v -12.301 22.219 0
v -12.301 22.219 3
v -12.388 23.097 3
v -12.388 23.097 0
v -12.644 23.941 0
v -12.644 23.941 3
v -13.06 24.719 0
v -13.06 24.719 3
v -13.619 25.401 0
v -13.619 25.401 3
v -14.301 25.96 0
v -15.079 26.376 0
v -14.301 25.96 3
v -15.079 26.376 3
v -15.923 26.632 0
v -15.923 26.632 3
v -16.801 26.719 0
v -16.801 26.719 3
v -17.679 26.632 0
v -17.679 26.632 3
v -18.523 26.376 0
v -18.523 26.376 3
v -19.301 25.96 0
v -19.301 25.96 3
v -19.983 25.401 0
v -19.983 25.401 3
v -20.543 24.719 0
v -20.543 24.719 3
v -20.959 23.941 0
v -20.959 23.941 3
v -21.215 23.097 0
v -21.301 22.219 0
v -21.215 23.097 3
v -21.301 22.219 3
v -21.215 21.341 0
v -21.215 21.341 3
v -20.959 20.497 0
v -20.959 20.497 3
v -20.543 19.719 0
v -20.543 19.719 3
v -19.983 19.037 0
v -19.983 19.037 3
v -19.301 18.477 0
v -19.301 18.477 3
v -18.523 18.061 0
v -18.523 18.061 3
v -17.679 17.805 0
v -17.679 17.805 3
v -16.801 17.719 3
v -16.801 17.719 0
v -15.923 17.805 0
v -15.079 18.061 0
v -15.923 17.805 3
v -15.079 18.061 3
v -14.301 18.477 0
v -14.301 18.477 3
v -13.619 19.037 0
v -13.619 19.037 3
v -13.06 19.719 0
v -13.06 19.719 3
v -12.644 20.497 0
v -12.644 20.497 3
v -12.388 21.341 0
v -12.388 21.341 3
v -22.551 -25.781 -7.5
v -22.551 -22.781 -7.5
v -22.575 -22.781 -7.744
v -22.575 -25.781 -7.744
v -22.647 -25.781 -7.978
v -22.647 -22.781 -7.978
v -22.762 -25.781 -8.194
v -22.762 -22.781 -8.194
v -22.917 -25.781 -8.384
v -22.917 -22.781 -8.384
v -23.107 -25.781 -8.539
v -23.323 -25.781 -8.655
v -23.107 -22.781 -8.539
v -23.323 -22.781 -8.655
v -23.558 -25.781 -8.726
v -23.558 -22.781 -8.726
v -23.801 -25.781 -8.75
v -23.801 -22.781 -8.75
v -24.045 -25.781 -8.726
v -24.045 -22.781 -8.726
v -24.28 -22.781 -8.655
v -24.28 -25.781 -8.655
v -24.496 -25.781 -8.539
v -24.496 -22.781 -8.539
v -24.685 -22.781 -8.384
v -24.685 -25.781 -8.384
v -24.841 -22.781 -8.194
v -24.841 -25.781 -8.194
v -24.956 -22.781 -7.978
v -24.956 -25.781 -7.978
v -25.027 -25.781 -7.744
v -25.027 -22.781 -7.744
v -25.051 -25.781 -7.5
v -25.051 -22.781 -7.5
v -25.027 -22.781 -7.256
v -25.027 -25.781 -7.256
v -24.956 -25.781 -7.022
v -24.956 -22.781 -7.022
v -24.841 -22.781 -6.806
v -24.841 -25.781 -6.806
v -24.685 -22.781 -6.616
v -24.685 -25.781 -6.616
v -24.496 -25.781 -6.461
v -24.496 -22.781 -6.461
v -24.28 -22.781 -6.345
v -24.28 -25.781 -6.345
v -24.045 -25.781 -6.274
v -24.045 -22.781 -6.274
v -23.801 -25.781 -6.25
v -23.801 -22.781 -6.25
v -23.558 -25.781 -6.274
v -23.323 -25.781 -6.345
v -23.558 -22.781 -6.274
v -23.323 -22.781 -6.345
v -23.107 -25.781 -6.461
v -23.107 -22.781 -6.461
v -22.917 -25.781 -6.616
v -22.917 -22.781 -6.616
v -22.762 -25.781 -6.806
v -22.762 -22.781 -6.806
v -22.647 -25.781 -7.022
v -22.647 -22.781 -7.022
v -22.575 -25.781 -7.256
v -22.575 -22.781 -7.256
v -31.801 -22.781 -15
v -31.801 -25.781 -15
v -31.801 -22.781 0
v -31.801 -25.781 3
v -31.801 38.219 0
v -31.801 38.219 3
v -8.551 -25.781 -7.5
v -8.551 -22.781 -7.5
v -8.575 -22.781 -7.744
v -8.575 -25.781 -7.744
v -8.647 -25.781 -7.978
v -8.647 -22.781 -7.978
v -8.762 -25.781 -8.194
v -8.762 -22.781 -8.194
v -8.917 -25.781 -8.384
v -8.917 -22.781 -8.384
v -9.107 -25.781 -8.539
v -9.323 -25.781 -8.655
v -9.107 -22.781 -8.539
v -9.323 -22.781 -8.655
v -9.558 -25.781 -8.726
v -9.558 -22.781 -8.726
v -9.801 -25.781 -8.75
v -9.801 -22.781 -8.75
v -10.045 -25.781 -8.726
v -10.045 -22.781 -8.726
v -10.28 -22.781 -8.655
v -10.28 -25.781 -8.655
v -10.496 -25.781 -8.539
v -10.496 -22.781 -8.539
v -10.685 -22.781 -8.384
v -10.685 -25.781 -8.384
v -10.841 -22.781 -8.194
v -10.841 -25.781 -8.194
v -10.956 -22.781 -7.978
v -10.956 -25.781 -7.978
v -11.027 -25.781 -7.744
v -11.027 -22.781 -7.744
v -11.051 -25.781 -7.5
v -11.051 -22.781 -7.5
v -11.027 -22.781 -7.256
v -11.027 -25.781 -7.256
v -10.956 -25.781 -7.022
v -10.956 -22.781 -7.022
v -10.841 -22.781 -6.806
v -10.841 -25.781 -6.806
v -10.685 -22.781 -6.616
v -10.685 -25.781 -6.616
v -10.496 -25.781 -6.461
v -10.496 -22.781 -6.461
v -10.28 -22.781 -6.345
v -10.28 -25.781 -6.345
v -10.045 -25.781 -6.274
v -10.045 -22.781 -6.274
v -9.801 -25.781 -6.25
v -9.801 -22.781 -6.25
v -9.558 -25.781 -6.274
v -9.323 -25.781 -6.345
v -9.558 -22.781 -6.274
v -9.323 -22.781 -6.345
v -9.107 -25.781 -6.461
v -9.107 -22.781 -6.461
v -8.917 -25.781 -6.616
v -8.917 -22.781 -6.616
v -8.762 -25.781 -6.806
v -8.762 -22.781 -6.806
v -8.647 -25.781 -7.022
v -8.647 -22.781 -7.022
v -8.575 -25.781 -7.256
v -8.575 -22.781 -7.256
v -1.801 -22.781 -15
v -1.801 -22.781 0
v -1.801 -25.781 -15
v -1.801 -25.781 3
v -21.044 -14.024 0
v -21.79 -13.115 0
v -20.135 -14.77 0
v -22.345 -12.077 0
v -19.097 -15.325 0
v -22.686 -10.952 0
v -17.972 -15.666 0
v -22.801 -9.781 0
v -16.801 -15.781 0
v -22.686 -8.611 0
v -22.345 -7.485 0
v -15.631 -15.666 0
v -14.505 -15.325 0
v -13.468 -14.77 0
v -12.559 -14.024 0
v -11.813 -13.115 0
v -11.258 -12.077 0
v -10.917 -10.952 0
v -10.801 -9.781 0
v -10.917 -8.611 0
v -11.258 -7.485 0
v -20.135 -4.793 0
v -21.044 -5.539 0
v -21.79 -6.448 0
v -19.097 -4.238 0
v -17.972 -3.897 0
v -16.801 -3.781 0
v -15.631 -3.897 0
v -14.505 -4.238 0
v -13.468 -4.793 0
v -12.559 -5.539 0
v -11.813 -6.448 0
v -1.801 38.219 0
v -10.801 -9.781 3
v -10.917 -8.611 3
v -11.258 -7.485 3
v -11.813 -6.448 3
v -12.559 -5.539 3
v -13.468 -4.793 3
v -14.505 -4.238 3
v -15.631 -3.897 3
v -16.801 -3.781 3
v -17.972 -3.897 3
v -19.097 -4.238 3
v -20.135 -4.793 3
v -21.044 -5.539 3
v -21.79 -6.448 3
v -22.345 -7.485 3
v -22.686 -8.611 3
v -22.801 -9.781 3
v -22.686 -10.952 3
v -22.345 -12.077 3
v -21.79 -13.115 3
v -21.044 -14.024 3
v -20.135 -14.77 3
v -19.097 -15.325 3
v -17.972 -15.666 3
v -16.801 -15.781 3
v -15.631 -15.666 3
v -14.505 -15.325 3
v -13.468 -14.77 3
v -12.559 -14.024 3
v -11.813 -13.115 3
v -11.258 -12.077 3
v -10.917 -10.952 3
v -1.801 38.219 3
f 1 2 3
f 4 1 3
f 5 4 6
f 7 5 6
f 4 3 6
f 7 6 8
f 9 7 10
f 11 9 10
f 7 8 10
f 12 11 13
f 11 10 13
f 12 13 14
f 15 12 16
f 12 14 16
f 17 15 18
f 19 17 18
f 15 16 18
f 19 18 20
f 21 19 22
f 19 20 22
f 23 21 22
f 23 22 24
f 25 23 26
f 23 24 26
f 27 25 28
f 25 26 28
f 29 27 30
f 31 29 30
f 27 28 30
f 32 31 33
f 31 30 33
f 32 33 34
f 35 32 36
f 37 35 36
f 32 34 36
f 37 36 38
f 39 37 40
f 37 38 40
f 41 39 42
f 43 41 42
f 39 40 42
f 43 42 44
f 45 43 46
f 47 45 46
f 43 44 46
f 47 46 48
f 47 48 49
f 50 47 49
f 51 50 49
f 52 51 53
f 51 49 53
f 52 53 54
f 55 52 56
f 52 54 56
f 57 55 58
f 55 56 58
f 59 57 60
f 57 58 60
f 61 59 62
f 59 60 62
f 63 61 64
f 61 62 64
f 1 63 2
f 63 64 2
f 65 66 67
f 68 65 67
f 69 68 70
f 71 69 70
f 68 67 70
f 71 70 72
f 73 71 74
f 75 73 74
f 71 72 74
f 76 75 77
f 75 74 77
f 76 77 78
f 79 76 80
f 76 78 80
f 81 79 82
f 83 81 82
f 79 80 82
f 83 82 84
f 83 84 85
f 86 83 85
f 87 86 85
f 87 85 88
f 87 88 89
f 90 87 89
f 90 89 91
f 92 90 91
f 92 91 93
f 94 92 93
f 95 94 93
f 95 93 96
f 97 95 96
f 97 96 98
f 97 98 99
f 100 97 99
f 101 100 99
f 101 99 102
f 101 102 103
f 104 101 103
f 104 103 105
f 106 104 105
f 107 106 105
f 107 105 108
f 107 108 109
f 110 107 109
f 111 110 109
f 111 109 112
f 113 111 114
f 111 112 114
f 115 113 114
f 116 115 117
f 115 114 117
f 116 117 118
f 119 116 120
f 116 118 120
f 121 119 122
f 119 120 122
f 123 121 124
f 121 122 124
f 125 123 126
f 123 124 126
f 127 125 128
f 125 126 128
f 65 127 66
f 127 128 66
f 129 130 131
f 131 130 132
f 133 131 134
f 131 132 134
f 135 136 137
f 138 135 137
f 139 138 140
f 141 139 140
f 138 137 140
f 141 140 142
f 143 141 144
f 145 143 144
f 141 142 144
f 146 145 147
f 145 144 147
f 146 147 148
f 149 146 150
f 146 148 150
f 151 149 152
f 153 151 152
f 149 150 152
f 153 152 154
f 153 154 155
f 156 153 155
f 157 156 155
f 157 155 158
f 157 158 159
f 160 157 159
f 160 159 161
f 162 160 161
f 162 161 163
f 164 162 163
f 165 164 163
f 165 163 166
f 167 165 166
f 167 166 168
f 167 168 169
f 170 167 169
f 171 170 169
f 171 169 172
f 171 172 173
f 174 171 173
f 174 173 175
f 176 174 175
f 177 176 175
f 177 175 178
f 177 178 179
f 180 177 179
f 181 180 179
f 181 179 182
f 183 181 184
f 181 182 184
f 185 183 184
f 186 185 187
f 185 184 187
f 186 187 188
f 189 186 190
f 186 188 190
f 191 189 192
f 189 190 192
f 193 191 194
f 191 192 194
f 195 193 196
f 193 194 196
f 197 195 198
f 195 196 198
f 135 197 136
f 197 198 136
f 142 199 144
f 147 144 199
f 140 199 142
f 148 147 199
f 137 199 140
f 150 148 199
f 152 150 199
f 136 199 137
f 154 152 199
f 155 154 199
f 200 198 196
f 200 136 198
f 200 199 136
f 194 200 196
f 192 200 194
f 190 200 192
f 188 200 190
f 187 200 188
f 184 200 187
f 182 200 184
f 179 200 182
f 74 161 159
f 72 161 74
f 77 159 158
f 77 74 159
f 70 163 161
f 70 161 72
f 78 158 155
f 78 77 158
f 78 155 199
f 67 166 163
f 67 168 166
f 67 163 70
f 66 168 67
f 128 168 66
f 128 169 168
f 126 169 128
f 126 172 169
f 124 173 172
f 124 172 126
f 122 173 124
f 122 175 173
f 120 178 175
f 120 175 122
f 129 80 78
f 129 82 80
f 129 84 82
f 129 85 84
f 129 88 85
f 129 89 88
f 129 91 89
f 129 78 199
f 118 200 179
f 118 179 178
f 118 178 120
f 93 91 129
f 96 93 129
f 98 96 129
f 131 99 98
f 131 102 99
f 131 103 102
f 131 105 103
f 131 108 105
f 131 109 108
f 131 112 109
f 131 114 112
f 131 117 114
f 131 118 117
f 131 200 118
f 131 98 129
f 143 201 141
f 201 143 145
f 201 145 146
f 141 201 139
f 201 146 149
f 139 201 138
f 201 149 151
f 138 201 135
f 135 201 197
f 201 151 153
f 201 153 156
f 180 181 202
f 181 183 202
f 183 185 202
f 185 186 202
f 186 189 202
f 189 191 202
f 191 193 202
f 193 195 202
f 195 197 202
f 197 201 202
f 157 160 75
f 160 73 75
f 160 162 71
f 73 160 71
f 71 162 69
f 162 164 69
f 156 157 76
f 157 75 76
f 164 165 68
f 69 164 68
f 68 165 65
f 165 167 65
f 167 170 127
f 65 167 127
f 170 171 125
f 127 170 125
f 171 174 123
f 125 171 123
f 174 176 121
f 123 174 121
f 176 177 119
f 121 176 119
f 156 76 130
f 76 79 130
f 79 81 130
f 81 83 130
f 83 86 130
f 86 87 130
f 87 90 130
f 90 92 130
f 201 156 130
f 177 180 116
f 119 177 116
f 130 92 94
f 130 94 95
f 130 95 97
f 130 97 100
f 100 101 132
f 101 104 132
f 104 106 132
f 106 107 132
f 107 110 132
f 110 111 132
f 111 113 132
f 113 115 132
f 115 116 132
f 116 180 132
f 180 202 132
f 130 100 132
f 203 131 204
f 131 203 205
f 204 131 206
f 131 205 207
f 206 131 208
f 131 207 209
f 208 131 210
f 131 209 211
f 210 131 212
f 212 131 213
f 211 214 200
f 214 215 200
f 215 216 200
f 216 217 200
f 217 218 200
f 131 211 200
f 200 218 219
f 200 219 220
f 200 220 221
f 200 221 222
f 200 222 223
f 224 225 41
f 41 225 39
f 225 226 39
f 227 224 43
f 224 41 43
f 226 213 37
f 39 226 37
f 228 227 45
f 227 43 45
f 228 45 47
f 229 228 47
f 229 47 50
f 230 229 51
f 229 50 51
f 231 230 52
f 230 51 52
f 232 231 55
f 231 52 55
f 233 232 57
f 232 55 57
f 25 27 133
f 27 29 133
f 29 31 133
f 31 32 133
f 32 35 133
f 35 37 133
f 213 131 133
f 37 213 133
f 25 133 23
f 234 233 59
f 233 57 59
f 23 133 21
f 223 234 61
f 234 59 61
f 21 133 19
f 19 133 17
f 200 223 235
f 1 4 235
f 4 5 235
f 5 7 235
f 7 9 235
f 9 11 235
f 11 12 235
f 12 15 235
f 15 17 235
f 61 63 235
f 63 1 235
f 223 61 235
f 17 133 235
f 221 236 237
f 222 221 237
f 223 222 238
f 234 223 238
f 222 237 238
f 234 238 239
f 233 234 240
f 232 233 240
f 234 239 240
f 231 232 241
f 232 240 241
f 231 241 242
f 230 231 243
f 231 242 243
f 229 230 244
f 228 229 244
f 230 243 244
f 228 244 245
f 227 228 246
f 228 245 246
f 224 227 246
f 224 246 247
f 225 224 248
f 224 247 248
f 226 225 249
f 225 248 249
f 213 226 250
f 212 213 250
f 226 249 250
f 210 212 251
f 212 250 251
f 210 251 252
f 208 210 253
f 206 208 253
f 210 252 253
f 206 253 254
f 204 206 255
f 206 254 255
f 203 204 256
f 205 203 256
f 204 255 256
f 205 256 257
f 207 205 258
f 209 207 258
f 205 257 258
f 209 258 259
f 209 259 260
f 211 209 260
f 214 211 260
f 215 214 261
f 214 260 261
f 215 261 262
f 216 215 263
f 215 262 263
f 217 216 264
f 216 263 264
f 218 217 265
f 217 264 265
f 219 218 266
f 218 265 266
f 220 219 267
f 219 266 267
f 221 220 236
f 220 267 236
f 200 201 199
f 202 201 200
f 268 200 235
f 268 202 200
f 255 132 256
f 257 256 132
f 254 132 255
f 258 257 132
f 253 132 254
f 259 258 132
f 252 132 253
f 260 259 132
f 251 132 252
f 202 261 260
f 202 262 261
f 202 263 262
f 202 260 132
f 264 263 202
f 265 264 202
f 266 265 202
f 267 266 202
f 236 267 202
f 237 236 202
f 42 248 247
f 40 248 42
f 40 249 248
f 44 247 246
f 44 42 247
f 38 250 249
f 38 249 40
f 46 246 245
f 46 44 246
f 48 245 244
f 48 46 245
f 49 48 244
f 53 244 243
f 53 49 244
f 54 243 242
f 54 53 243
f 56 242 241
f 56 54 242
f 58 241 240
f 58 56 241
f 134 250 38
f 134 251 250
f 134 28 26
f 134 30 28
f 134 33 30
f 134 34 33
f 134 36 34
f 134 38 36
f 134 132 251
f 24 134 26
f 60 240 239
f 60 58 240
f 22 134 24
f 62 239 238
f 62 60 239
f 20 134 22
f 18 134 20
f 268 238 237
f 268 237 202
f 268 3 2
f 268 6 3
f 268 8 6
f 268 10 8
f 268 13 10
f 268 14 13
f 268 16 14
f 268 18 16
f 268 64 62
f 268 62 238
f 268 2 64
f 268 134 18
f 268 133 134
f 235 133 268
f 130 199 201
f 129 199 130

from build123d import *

# Parameters (mm, degrees)
SKETCH1_W           = 30
SKETCH1_H           = 64
BOSS_EXTRUDE1_DEPTH = 3
SKETCH2_R           = 4.5
SKETCH2_R_2         = 6
CUT_EXTRUDE1_DEPTH  = 3
SKETCH4_W           = 30
SKETCH4_H           = 3
BOSS_EXTRUDE3_DEPTH = 15
SKETCH5_R           = 1.25
CUT_EXTRUDE2_DEPTH  = 15


with BuildPart() as part:
    # Sketch1 → Boss-Extrude1 (new body)
    with BuildSketch(Plane.XY):
        with Locations((-16.801372712, 6.218640229)):
            Rectangle(SKETCH1_W, SKETCH1_H)
    extrude(amount=BOSS_EXTRUDE1_DEPTH)

    # Sketch2 → Cut-Extrude1 (cut)
    with BuildSketch(Plane.XY.offset(3)):
        with Locations((-16.801372712, 22.218640229)):
            Circle(SKETCH2_R)
        with Locations((-16.801372712, -9.781359771)):
            Circle(SKETCH2_R_2)
    extrude(amount=-CUT_EXTRUDE1_DEPTH, mode=Mode.SUBTRACT)

    # Sketch4 → Boss-Extrude3 (add)
    with BuildSketch(Plane(origin=(0, 0, 0), x_dir=(-1, 0, 0), z_dir=(0, 0, -1))):
        with Locations((16.801372712, -24.281359771)):
            Rectangle(SKETCH4_W, SKETCH4_H)
    extrude(amount=BOSS_EXTRUDE3_DEPTH)

    # Sketch5 → Cut-Extrude2 (cut)
    with BuildSketch(Plane(origin=(0, -22.781359771, 0), x_dir=(1, 0, 0), z_dir=(0, 1, 0))):
        with Locations((-9.801372712, 7.5)):
            Circle(SKETCH5_R)
        with Locations((-23.801372712, 7.5)):
            Circle(SKETCH5_R)
    extrude(amount=-CUT_EXTRUDE2_DEPTH, mode=Mode.SUBTRACT)


solid = part.part
